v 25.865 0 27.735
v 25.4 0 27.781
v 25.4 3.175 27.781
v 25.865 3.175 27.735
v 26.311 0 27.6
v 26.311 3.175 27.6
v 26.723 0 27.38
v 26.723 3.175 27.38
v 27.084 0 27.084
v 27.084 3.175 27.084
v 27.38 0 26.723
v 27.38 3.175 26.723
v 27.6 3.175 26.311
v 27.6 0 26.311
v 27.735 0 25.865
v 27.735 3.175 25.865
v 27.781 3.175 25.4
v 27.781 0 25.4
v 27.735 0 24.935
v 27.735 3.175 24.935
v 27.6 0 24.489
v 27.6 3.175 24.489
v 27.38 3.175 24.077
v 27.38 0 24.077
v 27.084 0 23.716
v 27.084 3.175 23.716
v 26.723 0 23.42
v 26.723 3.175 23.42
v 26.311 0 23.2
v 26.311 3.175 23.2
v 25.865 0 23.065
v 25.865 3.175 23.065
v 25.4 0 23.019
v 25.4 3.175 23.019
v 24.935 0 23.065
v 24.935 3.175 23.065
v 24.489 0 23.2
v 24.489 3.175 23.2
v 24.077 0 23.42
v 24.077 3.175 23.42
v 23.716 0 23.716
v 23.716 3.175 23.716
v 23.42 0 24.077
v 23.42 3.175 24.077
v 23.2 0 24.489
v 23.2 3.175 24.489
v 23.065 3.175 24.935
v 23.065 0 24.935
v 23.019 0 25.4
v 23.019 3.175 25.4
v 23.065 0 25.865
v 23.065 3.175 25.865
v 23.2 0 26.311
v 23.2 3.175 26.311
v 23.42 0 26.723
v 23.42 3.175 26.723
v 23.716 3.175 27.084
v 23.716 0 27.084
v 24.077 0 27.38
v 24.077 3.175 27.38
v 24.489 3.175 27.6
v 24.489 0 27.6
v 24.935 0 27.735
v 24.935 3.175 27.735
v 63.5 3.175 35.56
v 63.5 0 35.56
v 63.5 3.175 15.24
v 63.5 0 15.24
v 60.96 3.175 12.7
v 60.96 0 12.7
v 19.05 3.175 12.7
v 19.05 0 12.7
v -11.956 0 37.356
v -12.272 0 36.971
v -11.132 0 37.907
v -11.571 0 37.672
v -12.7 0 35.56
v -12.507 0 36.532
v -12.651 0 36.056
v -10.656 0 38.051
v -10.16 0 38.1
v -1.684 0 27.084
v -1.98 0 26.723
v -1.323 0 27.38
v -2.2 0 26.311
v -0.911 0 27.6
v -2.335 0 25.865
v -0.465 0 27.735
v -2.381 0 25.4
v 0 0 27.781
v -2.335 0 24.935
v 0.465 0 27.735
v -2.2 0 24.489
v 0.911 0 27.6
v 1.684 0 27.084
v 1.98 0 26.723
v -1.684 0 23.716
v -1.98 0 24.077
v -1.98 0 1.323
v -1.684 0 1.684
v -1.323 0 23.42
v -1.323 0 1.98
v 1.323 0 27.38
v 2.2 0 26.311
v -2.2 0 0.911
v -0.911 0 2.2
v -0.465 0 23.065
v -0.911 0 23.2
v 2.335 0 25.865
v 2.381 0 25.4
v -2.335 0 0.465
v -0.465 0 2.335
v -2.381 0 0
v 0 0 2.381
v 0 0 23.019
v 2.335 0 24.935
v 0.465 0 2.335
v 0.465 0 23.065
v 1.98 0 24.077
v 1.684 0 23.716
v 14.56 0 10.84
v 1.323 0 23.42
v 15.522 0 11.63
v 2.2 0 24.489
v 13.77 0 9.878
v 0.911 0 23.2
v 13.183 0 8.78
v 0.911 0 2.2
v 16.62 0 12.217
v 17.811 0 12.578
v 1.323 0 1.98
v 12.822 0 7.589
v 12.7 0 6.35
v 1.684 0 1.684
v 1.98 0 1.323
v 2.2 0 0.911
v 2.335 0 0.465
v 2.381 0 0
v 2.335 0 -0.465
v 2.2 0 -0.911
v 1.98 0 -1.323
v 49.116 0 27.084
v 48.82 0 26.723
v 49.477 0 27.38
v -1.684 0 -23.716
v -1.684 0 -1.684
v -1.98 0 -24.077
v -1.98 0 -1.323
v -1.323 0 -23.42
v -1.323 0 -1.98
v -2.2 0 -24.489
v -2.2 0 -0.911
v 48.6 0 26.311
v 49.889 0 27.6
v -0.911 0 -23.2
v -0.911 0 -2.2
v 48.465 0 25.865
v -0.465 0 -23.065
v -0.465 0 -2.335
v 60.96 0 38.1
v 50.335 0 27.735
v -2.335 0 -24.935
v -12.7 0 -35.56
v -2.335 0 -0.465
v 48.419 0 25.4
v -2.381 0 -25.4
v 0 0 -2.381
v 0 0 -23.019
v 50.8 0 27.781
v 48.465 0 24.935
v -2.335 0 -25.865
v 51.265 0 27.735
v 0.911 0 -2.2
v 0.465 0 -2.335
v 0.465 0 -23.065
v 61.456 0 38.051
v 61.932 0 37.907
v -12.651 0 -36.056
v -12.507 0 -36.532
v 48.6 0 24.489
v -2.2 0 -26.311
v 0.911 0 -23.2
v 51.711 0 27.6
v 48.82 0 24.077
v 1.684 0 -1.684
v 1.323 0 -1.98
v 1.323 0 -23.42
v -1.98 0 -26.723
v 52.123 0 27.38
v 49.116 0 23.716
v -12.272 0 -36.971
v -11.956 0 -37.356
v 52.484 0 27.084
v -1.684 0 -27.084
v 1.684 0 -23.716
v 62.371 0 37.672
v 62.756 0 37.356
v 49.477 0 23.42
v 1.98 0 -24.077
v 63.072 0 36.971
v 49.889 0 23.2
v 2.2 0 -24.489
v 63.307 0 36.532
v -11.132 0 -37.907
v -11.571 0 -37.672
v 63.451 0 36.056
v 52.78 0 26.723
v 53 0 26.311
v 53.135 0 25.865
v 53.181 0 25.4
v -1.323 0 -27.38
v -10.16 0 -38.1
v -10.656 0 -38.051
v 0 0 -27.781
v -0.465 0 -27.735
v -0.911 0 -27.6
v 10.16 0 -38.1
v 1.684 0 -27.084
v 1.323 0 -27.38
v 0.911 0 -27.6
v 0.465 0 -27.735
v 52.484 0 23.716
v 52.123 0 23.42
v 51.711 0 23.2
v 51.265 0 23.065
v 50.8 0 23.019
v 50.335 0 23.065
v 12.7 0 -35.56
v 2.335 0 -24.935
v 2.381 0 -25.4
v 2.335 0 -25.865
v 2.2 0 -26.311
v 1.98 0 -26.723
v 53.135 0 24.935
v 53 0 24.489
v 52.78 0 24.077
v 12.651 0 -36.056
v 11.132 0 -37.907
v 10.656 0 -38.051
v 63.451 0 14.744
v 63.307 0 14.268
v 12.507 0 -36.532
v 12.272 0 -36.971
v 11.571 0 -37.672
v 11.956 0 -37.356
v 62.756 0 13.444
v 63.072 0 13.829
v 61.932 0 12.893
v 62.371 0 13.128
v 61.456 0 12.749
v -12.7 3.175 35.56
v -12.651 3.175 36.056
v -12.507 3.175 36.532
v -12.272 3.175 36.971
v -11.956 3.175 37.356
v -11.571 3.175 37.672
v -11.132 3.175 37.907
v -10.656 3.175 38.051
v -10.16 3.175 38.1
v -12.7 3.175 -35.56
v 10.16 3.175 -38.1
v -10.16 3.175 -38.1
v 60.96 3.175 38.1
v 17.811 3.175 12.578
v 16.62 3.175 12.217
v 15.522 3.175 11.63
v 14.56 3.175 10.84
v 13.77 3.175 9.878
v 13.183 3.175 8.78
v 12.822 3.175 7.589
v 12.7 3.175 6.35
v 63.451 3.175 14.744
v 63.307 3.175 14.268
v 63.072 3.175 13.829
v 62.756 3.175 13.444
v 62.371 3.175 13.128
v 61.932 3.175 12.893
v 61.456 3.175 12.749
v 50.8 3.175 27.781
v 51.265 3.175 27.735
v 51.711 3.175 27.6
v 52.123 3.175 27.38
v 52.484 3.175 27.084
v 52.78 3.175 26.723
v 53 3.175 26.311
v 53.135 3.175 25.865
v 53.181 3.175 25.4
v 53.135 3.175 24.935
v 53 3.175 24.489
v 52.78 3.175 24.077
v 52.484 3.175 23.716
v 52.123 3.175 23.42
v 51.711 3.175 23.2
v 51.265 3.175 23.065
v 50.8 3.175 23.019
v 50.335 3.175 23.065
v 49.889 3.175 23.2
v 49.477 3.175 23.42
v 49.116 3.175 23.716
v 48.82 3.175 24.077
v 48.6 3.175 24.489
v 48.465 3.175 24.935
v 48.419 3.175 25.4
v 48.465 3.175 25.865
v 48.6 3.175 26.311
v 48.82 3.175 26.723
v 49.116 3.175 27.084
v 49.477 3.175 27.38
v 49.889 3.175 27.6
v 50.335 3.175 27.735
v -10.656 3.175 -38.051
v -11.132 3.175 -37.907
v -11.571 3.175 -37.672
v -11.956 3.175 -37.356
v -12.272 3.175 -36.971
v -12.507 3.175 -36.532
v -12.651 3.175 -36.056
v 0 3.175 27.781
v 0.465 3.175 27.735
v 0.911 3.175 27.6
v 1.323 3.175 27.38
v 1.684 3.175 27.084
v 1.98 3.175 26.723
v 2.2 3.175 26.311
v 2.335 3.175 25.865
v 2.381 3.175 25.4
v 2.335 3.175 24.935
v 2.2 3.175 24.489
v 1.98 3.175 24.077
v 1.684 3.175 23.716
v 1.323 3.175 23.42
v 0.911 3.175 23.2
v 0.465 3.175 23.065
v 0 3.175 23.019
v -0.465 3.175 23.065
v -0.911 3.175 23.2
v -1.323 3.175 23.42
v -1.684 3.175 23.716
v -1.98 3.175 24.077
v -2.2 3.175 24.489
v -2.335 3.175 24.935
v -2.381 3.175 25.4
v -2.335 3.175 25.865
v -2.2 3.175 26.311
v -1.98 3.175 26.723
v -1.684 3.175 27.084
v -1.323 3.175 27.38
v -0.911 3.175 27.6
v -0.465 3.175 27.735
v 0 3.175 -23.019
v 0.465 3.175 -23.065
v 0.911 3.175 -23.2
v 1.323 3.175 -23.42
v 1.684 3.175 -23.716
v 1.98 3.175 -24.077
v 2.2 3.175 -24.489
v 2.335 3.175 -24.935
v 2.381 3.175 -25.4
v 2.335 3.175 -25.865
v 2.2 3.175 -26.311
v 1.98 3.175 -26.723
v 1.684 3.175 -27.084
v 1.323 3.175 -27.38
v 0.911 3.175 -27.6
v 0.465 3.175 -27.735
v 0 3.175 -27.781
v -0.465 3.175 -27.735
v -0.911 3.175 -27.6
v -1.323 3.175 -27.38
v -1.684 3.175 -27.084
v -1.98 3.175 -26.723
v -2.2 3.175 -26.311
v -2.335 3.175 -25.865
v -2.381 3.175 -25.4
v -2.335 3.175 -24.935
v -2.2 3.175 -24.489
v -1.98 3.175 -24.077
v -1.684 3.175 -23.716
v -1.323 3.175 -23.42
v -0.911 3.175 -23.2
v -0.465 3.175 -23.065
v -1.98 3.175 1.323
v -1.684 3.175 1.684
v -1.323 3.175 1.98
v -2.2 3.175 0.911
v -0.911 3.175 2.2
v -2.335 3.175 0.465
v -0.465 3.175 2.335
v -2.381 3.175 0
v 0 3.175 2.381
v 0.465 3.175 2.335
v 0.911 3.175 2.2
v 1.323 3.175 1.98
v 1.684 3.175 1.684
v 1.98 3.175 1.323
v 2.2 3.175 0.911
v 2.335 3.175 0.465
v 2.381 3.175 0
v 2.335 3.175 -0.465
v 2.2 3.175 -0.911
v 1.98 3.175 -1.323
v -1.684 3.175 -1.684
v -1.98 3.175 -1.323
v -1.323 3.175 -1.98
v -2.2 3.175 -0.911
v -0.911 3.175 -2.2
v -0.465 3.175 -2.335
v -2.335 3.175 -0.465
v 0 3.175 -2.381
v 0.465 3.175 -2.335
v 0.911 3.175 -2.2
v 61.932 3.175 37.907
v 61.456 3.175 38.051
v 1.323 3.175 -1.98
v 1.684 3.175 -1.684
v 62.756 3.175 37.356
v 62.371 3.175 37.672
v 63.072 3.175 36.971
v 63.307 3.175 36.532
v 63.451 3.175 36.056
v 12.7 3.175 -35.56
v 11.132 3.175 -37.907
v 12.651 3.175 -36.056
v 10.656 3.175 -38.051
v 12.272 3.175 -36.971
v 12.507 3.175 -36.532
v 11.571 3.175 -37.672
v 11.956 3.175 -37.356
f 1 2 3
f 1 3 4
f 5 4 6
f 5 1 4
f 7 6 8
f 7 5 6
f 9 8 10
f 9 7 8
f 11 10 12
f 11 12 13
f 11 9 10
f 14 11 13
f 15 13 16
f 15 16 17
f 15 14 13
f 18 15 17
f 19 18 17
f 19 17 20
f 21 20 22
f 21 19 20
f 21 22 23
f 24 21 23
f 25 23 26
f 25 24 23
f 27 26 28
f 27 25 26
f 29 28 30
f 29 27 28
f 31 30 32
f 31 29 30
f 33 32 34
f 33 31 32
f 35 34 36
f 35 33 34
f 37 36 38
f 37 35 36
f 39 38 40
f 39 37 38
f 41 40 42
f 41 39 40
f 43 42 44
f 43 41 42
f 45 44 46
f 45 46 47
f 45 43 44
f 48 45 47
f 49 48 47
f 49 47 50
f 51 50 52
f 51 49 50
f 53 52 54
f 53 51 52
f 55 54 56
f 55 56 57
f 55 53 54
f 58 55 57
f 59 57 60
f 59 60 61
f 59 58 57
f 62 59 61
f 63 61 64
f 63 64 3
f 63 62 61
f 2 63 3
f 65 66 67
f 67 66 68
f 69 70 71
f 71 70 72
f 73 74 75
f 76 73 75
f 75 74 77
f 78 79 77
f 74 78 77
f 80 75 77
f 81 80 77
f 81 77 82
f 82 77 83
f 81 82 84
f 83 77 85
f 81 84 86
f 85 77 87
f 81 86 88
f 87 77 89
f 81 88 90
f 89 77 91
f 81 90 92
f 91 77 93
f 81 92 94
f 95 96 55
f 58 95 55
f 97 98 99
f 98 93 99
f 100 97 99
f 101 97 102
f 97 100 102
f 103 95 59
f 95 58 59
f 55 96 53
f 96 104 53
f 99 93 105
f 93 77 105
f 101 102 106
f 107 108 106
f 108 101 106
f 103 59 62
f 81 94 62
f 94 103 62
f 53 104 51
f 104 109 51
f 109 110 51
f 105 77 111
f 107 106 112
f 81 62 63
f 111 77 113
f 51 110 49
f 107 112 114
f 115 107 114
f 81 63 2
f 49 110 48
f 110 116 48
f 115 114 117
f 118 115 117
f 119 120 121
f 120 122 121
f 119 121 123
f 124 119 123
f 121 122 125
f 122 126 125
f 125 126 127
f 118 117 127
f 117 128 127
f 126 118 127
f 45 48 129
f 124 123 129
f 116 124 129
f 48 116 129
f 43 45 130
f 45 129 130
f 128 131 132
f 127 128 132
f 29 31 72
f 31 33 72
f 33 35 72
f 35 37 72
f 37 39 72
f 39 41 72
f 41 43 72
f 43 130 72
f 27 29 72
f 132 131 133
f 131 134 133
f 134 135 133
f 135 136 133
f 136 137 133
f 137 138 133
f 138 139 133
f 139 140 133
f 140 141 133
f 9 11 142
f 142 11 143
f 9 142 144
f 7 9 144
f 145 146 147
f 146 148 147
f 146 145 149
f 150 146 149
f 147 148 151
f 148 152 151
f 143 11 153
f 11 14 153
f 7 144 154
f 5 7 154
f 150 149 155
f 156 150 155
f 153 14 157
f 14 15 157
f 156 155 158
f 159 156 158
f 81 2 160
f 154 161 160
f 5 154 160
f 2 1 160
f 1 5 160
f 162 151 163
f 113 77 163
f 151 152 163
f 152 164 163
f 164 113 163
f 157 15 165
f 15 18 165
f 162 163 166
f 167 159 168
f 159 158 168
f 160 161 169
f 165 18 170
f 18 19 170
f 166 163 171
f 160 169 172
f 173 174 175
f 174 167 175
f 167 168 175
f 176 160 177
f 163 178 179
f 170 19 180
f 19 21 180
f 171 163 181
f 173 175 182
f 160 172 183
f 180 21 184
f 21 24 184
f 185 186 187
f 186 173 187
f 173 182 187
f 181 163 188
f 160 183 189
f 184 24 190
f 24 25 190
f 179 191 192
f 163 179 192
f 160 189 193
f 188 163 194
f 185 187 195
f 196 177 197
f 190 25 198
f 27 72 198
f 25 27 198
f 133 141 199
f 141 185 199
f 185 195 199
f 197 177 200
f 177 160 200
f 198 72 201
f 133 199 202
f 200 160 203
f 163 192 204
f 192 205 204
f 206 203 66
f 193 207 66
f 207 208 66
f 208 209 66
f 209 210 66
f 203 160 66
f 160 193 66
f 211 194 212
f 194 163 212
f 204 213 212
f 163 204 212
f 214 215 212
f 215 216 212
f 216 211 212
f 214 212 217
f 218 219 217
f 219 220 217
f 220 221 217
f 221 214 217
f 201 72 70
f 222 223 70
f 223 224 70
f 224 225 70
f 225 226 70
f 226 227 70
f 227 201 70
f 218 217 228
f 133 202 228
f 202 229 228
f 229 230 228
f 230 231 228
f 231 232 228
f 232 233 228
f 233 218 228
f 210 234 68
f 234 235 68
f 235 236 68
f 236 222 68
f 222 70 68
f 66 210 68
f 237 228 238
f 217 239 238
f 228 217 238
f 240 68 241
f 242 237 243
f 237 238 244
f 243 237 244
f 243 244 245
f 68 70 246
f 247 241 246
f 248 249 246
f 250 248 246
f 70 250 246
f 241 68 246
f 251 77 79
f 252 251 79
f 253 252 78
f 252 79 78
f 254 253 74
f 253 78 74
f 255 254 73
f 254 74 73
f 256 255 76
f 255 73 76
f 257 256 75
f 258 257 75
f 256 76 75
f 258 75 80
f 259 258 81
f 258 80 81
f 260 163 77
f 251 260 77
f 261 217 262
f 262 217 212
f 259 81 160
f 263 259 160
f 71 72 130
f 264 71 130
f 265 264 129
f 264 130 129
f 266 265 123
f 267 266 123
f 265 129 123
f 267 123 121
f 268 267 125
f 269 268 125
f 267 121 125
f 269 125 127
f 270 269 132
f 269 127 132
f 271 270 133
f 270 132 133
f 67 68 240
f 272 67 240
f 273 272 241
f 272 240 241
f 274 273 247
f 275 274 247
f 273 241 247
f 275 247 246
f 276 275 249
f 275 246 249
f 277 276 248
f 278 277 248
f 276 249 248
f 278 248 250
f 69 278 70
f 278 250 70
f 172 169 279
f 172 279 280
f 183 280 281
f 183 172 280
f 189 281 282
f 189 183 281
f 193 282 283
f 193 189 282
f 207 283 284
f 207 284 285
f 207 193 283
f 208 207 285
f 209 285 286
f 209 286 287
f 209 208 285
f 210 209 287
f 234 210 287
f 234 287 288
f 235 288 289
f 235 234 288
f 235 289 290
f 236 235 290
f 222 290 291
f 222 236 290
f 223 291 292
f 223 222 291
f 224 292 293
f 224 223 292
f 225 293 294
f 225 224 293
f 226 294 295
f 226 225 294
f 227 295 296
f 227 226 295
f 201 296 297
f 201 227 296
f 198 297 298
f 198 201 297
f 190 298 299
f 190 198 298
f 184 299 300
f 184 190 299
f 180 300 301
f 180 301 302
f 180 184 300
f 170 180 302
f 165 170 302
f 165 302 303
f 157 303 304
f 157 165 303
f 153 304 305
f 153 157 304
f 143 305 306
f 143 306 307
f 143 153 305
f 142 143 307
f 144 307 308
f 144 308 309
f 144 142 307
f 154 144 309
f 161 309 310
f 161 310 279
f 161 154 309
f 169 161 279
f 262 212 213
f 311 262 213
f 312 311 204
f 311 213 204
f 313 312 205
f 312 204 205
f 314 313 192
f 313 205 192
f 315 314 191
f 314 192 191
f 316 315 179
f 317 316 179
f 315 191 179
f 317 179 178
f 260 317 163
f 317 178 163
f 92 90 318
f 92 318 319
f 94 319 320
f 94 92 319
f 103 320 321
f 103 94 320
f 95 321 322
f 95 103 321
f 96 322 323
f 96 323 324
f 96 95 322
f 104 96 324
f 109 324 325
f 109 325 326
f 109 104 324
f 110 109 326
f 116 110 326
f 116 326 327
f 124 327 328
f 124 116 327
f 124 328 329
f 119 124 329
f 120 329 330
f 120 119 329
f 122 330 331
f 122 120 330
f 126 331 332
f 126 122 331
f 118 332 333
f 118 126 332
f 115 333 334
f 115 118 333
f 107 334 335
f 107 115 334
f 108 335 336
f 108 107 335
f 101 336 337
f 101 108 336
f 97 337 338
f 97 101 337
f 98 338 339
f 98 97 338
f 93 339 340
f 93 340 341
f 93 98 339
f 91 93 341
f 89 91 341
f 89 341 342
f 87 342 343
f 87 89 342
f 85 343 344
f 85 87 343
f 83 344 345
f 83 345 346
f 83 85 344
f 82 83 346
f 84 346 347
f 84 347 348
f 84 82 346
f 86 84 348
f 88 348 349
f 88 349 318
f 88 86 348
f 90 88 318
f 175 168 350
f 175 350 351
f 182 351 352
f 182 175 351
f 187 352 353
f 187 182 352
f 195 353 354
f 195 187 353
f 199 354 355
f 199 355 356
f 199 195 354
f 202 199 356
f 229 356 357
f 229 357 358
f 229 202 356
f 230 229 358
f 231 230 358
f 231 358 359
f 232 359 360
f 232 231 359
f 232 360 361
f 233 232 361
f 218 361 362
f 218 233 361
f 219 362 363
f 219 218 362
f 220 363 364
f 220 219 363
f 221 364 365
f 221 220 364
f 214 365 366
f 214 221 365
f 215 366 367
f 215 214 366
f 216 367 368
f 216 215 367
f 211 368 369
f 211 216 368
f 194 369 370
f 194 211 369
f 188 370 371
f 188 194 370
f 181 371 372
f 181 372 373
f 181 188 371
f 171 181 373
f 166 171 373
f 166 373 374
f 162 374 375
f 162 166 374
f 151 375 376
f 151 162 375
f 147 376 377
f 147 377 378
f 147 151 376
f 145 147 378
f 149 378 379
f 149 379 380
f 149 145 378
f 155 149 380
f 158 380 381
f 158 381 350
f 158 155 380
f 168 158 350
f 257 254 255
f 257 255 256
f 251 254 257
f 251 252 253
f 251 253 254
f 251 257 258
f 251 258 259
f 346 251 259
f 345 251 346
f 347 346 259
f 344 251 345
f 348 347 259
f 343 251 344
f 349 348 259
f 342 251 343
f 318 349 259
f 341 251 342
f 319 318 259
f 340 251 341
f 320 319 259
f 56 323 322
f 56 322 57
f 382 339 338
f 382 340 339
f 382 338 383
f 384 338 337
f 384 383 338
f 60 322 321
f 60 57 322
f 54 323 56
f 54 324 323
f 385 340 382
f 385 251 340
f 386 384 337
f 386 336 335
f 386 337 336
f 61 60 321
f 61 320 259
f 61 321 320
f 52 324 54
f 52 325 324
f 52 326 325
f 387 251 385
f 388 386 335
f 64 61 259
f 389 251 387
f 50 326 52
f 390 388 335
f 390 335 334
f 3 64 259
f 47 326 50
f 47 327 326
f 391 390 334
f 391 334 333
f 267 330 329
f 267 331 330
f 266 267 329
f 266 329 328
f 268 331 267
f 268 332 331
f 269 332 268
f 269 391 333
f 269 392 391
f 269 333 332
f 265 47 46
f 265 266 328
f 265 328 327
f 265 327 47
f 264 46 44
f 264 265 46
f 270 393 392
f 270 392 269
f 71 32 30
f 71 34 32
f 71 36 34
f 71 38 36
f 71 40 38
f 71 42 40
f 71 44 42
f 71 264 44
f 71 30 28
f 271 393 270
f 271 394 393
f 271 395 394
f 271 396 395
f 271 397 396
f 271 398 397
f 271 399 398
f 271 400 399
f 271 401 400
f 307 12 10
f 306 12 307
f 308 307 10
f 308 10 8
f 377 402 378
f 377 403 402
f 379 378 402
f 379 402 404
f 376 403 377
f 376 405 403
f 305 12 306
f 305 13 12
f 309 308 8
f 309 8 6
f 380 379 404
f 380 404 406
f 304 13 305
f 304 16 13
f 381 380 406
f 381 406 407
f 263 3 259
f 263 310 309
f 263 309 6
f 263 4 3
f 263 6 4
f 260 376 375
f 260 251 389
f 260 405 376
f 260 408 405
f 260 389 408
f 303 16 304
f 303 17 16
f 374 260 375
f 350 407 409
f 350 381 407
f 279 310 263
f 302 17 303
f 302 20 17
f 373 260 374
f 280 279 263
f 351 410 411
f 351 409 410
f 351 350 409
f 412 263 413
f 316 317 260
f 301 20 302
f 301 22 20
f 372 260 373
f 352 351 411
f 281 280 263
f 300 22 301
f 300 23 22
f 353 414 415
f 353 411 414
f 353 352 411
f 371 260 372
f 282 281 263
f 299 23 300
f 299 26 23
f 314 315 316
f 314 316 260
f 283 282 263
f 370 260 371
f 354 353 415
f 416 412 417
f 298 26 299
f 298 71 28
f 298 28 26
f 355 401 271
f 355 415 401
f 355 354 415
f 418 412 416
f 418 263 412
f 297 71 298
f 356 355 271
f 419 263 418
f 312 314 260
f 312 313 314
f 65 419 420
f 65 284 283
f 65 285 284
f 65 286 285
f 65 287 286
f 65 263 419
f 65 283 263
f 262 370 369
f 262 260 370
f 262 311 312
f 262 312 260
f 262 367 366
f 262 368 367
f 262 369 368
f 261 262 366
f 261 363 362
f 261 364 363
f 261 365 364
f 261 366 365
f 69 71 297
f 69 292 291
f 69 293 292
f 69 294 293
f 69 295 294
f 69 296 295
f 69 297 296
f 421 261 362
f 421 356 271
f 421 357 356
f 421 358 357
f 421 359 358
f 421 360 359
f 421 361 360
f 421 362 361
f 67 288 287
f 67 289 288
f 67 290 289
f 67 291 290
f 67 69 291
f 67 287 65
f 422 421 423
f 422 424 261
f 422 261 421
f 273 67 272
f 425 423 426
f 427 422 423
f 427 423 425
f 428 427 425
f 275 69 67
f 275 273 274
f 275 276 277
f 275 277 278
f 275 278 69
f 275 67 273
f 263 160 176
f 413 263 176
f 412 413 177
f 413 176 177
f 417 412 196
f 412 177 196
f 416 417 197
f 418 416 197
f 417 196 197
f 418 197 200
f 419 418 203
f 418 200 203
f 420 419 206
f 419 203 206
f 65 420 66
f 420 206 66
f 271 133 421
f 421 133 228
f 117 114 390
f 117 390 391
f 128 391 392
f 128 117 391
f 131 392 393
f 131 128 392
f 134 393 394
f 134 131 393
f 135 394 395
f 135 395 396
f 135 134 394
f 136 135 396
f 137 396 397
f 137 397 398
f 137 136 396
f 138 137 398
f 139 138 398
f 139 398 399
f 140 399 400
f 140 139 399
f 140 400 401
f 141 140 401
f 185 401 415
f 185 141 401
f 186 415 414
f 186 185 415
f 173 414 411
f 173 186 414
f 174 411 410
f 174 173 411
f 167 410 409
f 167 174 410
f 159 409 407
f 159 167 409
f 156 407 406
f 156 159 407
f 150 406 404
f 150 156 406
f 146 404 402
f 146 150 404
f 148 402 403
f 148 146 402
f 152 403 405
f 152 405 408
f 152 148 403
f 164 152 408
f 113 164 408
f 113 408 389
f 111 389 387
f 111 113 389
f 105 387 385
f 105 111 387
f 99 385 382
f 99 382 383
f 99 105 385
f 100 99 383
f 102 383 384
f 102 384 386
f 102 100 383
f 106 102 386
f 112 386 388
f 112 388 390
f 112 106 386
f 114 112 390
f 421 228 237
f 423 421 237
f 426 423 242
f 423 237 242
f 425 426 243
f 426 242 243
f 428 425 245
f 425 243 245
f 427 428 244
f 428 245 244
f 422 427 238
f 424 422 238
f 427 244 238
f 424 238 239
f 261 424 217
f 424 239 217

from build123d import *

# Parameters (mm, degrees)
SKETCH1_R           = 2.38125
BOSS_EXTRUDE1_DEPTH = 3.175


with BuildPart() as part:
    # Sketch1 → Boss-Extrude1 (new body)
    with BuildSketch(Plane(origin=(0, 0, 0), x_dir=(1, 0, 0), z_dir=(0, 1, 0))):
        with BuildLine():
            Line((-10.16, -38.1), (6.35, -38.1))
            Line((6.35, -38.1), (60.96, -38.1))
            ThreePointArc((60.96, -38.1), (62.756051224, -37.356051224), (63.5, -35.56))
            Line((63.5, -35.56), (63.5, -15.24))
            ThreePointArc((63.5, -15.24), (62.756051224, -13.443948776), (60.96, -12.7))
            Line((60.96, -12.7), (19.05, -12.7))
            ThreePointArc((19.05, -12.7), (14.559871939, -10.840128061), (12.7, -6.35))
            Line((12.7, -6.35), (12.7, 35.56))
            ThreePointArc((12.7, 35.56), (11.956051224, 37.356051224), (10.16, 38.1))
            Line((10.16, 38.1), (-10.16, 38.1))
            ThreePointArc((-10.16, 38.1), (-11.956051224, 37.356051224), (-12.7, 35.56))
            Line((-12.7, 35.56), (-12.7, -35.56))
            ThreePointArc((-12.7, -35.56), (-11.956051224, -37.356051224), (-10.16, -38.1))
        make_face()
        with Locations(Location((0, -25.4, 0), (0, 0, 270))):
            Circle(SKETCH1_R, mode=Mode.SUBTRACT)
        with Locations(Location((0, 0, 0), (0, 0, 270))):
            Circle(SKETCH1_R, mode=Mode.SUBTRACT)
        with Locations(Location((0, 25.4, 0), (0, 0, 270))):
            Circle(SKETCH1_R, mode=Mode.SUBTRACT)
        with Locations(Location((25.4, -25.4, 0), (0, 0, 270))):
            Circle(SKETCH1_R, mode=Mode.SUBTRACT)
        with Locations(Location((50.8, -25.4, 0), (0, 0, 270))):
            Circle(SKETCH1_R, mode=Mode.SUBTRACT)
    extrude(amount=BOSS_EXTRUDE1_DEPTH)


solid = part.part
